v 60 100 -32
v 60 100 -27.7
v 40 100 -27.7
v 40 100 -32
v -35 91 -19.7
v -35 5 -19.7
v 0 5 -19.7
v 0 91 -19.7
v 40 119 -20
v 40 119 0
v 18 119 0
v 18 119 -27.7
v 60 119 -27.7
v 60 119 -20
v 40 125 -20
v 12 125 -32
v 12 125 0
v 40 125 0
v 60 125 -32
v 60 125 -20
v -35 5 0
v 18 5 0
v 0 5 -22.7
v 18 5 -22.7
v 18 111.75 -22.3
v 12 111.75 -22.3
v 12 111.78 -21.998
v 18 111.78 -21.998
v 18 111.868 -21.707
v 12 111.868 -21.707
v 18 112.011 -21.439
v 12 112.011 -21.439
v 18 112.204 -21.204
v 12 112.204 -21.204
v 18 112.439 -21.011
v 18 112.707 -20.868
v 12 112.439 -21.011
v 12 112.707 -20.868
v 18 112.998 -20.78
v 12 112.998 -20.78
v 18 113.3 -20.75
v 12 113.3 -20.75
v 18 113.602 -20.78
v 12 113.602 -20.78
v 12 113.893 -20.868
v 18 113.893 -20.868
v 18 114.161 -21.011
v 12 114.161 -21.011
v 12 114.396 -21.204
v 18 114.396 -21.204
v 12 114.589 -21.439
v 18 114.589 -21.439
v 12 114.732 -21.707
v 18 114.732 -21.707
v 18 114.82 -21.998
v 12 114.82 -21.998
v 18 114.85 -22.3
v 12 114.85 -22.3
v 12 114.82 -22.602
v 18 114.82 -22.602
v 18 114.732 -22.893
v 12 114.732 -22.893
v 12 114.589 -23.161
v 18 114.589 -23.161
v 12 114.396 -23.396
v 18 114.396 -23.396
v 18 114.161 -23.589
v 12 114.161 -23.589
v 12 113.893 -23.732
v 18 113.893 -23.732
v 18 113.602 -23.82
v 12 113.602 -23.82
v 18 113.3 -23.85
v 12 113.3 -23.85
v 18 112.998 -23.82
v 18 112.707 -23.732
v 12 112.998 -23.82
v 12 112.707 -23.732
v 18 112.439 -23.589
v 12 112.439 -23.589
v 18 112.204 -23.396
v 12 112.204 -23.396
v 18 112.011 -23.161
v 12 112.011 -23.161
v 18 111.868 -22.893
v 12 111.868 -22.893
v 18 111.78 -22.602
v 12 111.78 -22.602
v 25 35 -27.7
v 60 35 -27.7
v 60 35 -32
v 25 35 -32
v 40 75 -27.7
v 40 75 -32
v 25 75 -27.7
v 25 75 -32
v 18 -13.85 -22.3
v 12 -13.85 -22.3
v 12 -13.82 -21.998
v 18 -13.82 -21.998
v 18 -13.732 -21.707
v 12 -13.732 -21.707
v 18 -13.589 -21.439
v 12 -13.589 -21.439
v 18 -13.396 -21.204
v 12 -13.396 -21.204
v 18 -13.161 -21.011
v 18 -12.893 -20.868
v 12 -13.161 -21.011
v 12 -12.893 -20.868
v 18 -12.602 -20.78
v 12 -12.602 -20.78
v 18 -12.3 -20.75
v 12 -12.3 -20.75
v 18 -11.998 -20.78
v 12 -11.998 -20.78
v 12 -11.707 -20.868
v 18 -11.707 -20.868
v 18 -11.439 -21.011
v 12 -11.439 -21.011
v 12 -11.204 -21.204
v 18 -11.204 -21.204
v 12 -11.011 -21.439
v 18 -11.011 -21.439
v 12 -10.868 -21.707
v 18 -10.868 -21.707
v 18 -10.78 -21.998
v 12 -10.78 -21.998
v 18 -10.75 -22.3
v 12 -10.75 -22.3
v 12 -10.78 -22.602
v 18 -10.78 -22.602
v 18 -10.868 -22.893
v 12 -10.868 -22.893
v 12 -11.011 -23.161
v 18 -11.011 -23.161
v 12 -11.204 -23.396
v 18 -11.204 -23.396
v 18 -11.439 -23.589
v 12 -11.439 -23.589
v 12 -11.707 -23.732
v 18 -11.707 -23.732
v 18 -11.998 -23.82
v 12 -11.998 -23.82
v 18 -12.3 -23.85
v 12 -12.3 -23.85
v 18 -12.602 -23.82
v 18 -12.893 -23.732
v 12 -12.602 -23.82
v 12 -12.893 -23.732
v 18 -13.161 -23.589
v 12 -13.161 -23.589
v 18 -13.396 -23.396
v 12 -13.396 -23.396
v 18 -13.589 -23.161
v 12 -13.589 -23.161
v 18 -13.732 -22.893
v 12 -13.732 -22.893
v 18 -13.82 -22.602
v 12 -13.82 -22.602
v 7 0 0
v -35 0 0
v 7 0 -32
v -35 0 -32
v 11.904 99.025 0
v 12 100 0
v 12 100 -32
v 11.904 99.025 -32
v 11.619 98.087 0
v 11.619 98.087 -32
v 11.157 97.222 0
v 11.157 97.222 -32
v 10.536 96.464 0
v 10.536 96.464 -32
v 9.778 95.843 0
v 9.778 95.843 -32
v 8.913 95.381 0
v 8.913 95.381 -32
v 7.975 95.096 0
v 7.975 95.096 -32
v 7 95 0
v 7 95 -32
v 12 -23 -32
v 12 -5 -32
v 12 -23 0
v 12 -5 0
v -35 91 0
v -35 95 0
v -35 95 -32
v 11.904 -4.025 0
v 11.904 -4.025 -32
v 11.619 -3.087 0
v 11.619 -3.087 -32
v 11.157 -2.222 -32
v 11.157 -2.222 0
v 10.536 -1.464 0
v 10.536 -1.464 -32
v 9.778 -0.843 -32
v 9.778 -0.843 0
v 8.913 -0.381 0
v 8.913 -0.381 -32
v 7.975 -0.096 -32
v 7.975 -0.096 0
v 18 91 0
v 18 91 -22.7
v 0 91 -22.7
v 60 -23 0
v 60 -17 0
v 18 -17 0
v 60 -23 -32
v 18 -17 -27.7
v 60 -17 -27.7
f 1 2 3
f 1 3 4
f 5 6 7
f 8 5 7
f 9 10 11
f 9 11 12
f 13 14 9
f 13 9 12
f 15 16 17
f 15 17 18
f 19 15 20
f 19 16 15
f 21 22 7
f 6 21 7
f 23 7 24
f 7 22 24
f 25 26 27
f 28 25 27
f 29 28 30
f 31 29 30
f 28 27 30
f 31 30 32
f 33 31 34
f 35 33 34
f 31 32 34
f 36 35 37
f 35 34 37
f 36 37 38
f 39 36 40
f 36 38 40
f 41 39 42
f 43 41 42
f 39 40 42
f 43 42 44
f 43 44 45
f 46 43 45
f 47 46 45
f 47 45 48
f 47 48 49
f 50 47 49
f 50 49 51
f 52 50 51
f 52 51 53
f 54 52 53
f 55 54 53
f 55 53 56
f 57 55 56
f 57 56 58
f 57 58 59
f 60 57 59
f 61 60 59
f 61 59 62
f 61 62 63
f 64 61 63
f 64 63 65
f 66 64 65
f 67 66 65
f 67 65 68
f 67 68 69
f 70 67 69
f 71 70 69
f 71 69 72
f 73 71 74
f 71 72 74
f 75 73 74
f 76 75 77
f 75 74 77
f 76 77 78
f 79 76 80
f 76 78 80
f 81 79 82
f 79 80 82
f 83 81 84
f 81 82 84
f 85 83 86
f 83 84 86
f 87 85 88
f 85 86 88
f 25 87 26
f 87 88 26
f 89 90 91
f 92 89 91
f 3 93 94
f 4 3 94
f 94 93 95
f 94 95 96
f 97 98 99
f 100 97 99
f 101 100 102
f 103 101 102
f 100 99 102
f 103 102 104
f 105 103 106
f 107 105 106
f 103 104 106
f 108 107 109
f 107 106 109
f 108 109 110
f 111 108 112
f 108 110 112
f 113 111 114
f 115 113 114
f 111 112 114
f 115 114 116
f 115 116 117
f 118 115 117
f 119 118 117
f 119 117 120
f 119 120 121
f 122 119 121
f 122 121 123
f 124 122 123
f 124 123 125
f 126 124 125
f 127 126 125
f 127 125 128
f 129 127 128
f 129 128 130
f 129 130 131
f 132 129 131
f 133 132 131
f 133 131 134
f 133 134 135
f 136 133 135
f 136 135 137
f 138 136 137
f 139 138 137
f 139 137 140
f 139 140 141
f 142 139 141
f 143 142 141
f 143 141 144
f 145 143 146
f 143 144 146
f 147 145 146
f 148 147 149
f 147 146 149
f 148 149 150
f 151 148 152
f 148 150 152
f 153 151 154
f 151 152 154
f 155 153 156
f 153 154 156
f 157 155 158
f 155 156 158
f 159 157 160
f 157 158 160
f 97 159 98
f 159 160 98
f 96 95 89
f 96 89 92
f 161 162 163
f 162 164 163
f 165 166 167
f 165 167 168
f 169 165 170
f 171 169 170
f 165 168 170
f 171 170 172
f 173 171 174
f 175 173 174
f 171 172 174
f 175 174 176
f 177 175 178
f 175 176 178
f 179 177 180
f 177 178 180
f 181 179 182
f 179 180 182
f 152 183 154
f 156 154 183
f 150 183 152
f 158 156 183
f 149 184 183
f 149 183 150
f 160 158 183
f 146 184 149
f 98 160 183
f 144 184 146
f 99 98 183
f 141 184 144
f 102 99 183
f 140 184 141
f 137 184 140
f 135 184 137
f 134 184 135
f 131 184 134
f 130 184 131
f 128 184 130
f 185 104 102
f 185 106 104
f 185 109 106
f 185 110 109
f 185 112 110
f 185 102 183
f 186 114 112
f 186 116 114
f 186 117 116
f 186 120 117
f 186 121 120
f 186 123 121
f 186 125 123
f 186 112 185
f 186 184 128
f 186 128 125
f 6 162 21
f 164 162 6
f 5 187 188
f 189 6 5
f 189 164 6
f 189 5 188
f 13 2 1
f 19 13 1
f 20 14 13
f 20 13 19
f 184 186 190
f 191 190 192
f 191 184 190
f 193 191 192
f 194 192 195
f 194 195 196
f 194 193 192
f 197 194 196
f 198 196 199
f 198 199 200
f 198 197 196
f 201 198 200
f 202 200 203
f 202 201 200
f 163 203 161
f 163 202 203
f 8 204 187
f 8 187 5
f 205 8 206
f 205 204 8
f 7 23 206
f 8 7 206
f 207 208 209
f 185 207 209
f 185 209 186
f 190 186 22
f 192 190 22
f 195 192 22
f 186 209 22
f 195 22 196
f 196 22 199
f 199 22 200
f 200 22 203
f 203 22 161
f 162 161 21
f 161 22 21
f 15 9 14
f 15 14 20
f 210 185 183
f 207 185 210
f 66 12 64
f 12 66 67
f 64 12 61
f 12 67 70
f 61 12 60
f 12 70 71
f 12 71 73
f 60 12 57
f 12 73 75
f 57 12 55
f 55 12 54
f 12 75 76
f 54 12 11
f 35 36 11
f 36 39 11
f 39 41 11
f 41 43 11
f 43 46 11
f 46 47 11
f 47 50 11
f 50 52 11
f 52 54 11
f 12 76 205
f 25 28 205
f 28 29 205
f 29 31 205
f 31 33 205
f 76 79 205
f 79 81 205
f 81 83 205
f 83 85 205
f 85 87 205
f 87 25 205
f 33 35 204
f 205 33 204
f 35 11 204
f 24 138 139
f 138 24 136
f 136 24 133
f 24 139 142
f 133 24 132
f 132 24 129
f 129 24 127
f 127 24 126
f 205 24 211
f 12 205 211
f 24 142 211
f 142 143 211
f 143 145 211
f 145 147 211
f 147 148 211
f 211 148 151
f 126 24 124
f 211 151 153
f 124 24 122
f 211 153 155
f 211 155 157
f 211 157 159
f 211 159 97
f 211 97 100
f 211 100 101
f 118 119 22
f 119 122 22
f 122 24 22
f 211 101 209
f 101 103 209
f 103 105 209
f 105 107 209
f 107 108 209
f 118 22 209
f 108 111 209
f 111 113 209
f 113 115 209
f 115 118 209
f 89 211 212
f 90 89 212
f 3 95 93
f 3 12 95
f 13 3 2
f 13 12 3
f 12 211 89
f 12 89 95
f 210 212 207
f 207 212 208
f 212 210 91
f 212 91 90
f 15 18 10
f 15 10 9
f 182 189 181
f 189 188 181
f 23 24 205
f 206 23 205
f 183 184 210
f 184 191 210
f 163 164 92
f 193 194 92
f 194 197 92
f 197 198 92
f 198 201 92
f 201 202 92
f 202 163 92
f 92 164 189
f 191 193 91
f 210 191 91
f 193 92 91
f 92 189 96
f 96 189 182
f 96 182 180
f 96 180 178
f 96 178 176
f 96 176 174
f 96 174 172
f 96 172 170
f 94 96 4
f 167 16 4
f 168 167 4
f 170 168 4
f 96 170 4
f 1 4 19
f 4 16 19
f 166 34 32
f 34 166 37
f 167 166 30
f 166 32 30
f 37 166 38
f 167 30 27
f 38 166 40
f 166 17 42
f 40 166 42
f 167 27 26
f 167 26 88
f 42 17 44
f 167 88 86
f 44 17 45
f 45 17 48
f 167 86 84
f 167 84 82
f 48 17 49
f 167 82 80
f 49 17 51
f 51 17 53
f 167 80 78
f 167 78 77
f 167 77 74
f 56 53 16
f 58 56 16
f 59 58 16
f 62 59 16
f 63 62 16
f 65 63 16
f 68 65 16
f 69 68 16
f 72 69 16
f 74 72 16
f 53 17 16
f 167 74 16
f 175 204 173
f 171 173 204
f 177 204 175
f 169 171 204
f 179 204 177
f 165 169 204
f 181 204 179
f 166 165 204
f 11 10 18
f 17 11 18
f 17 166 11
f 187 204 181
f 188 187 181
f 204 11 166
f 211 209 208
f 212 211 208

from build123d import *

# Parameters (mm, degrees)
SKETCH_1_W           = 130
SKETCH_1_H           = 64
EXTRUDE_1_DEPTH      = 125
SKETCH_2_W           = 55.4
SKETCH_2_H           = 114
CUT_EXTRUDE_1_DEPTH  = 47
SKETCH_3_W           = 45.4
SKETCH_3_H           = 86
CUT_EXTRUDE_2_DEPTH  = 78
SKETCH_4_W           = 24.038907643
SKETCH_4_H           = 40
CUT_EXTRUDE_3_DEPTH  = 40
SKETCH_5_W           = 4.3
SKETCH_5_H           = 25
CUT_EXTRUDE_4_DEPTH  = 25
SKETCH_6_W           = 10
SKETCH_6_H           = 40
CUT_EXTRUDE_5_DEPTH  = 25
SKETCH_9_W           = 5
SKETCH_9_H           = 125
CUT_EXTRUDE_8_DEPTH  = 155.744951452
SKETCH_12_W          = 32
SKETCH_12_H          = 30
CUT_EXTRUDE_10_DEPTH = 155.744951452
SKETCH_13_W          = 45
SKETCH_13_H          = 64
CUT_EXTRUDE_11_DEPTH = 30
SKETCH_14_W          = 32
SKETCH_14_H          = 157.482614071
CUT_EXTRUDE_12_DEPTH = 180.649659059
SKETCH_18_W          = 30
SKETCH_18_H          = 95
CUT_EXTRUDE_15_DEPTH = 145.478372084
SKETCH_19_W          = 35
SKETCH_19_H          = 86
EXTRUDE_4_DEPTH      = 3
SKETCH_20_W          = 20
SKETCH_20_H          = 6
CUT_EXTRUDE_16_DEPTH = 150.244765402
FILLET_1_R           = 5
SKETCH_21_W          = 42
SKETCH_21_H          = 27.7
CUT_EXTRUDE_17_DEPTH = 138.927517197
EXTRUDE_7_DEPTH      = 27.7
SKETCH_23_W          = 48
SKETCH_23_H          = 4.3
EXTRUDE_8_DEPTH      = 23
SKETCH_25_R          = 1.55
CUT_EXTRUDE_19_DEPTH = 138.669895039
FILLET_3_R           = 5


with BuildPart() as part:
    # 草图1 → 凸台-拉伸1 (new body)
    with BuildSketch(Plane(origin=(0, 0, 0), x_dir=(1, 0, 0), z_dir=(0, 1, 0))):
        Rectangle(SKETCH_1_W, SKETCH_1_H)
    extrude(amount=EXTRUDE_1_DEPTH)

    # 草图2 → 切除-拉伸1 (cut)
    with BuildSketch(Plane(origin=(65, 0, 0), x_dir=(0, 0, -1), z_dir=(1, 0, 0))):
        with Locations((0, 62)):
            Rectangle(SKETCH_2_W, SKETCH_2_H)
    extrude(amount=-CUT_EXTRUDE_1_DEPTH, mode=Mode.SUBTRACT)

    # 草图3 → 切除-拉伸2 (cut)
    with BuildSketch(Plane(origin=(18, 0, 0), x_dir=(0, 0, -1), z_dir=(1, 0, 0))):
        with Locations((0, 48)):
            Rectangle(SKETCH_3_W, SKETCH_3_H)
    extrude(amount=-CUT_EXTRUDE_2_DEPTH, mode=Mode.SUBTRACT)

    # 草图4 → 切除-拉伸3 (cut)
    with BuildSketch(Plane(origin=(65, 0, 0), x_dir=(0, 0, -1), z_dir=(1, 0, 0))):
        with Locations((26.569318974, 55)):
            Rectangle(SKETCH_4_W, SKETCH_4_H)
    extrude(amount=-CUT_EXTRUDE_3_DEPTH, mode=Mode.SUBTRACT)

    # 草图5 → 切除-拉伸4 (cut)
    with BuildSketch(Plane(origin=(65, 0, 0), x_dir=(0, 0, -1), z_dir=(1, 0, 0))):
        with Locations((29.85, 87.5)):
            Rectangle(SKETCH_5_W, SKETCH_5_H)
    extrude(amount=-CUT_EXTRUDE_4_DEPTH, mode=Mode.SUBTRACT)

    # 草图6 → 切除-拉伸5 (cut)
    with BuildSketch(Plane(origin=(0, 125, 0), x_dir=(1, 0, 0), z_dir=(0, 1, 0))):
        with Locations((45, 0)):
            Rectangle(SKETCH_6_W, SKETCH_6_H)
    extrude(amount=-CUT_EXTRUDE_5_DEPTH, mode=Mode.SUBTRACT)

    # 草图9 → 切除-拉伸8 (cut, through all)
    with BuildSketch(Plane.XY.offset(32)):
        with Locations((62.5, 62.5)):
            Rectangle(SKETCH_9_W, SKETCH_9_H)
    extrude(amount=-CUT_EXTRUDE_8_DEPTH, mode=Mode.SUBTRACT)

    # 草图12 → 切除-拉伸10 (cut, through all)
    with BuildSketch(Plane.XY.offset(32)):
        with Locations((-49, 110)):
            Rectangle(SKETCH_12_W, SKETCH_12_H)
    extrude(amount=-CUT_EXTRUDE_10_DEPTH, mode=Mode.SUBTRACT)

    # 草图13 → 切除-拉伸11 (cut)
    with BuildSketch(Plane(origin=(0, 125, 0), x_dir=(1, 0, 0), z_dir=(0, 1, 0))):
        with Locations((-10.5, 0)):
            Rectangle(SKETCH_13_W, SKETCH_13_H)
    extrude(amount=-CUT_EXTRUDE_11_DEPTH, mode=Mode.SUBTRACT)

    # 草图14 → 切除-拉伸12 (cut, through all)
    with BuildSketch(Plane.ZY.offset(65)):
        with Locations((16, 78.741307036)):
            Rectangle(SKETCH_14_W, SKETCH_14_H)
    extrude(amount=-CUT_EXTRUDE_12_DEPTH, mode=Mode.SUBTRACT)

    # 草图18 → 切除-拉伸15 (cut, through all)
    with BuildSketch(Plane.XY):
        with Locations((-50, 47.5)):
            Rectangle(SKETCH_18_W, SKETCH_18_H)
    extrude(amount=-CUT_EXTRUDE_15_DEPTH, mode=Mode.SUBTRACT)

    # 草图19 → 凸台-拉伸4 (add)
    with BuildSketch(Plane.XY.offset(-22.7)):
        with Locations((-17.5, 48)):
            Rectangle(SKETCH_19_W, SKETCH_19_H)
    extrude(amount=EXTRUDE_4_DEPTH)

    # 草图20 → 切除-拉伸16 (cut, through all)
    with BuildSketch(Plane(origin=(40, 0, 0), x_dir=(0, 0, -1), z_dir=(1, 0, 0))):
        with Locations((10, 122)):
            Rectangle(SKETCH_20_W, SKETCH_20_H)
    extrude(amount=CUT_EXTRUDE_16_DEPTH, mode=Mode.SUBTRACT)

    # 圆角1
    fillet_1_edges = [part.edges().sort_by_distance(p)[0] for p in [
        (12, 95, -16),
    ]]
    fillet(fillet_1_edges, radius=FILLET_1_R)

    # 草图21 → 切除-拉伸17 (cut, through all)
    with BuildSketch(Plane(origin=(0, 5, 0), x_dir=(1, 0, 0), z_dir=(0, 1, 0))):
        with Locations((39, 13.85)):
            Rectangle(SKETCH_21_W, SKETCH_21_H)
    extrude(amount=-CUT_EXTRUDE_17_DEPTH, mode=Mode.SUBTRACT)

    # 草图22 → 凸台-拉伸7 (add)
    with BuildSketch(Plane.XY):
        Polygon((12, 0), (18, 0), (18, -17), (60, -17), (60, -23), (12, -23), align=None)
    extrude(amount=-EXTRUDE_7_DEPTH)

    # 草图23 → 凸台-拉伸8 (add)
    with BuildSketch(Plane.XZ):
        with Locations((36, -29.85)):
            Rectangle(SKETCH_23_W, SKETCH_23_H)
    extrude(amount=EXTRUDE_8_DEPTH)

    # 草图25 → 切除-拉伸19 (cut, through all)
    with BuildSketch(Plane.ZY.offset(-12)):
        with Locations(Location((-22.3, 113.3, 0), (0, 0, 270))):
            Circle(SKETCH_25_R)
        with Locations(Location((-22.3, -12.3, 0), (0, 0, 270))):
            Circle(SKETCH_25_R)
    extrude(amount=-CUT_EXTRUDE_19_DEPTH, mode=Mode.SUBTRACT)

    # 圆角3
    fillet_3_edges = [part.edges().sort_by_distance(p)[0] for p in [
        (12, 0, -16),
    ]]
    fillet(fillet_3_edges, radius=FILLET_3_R)


solid = part.part
